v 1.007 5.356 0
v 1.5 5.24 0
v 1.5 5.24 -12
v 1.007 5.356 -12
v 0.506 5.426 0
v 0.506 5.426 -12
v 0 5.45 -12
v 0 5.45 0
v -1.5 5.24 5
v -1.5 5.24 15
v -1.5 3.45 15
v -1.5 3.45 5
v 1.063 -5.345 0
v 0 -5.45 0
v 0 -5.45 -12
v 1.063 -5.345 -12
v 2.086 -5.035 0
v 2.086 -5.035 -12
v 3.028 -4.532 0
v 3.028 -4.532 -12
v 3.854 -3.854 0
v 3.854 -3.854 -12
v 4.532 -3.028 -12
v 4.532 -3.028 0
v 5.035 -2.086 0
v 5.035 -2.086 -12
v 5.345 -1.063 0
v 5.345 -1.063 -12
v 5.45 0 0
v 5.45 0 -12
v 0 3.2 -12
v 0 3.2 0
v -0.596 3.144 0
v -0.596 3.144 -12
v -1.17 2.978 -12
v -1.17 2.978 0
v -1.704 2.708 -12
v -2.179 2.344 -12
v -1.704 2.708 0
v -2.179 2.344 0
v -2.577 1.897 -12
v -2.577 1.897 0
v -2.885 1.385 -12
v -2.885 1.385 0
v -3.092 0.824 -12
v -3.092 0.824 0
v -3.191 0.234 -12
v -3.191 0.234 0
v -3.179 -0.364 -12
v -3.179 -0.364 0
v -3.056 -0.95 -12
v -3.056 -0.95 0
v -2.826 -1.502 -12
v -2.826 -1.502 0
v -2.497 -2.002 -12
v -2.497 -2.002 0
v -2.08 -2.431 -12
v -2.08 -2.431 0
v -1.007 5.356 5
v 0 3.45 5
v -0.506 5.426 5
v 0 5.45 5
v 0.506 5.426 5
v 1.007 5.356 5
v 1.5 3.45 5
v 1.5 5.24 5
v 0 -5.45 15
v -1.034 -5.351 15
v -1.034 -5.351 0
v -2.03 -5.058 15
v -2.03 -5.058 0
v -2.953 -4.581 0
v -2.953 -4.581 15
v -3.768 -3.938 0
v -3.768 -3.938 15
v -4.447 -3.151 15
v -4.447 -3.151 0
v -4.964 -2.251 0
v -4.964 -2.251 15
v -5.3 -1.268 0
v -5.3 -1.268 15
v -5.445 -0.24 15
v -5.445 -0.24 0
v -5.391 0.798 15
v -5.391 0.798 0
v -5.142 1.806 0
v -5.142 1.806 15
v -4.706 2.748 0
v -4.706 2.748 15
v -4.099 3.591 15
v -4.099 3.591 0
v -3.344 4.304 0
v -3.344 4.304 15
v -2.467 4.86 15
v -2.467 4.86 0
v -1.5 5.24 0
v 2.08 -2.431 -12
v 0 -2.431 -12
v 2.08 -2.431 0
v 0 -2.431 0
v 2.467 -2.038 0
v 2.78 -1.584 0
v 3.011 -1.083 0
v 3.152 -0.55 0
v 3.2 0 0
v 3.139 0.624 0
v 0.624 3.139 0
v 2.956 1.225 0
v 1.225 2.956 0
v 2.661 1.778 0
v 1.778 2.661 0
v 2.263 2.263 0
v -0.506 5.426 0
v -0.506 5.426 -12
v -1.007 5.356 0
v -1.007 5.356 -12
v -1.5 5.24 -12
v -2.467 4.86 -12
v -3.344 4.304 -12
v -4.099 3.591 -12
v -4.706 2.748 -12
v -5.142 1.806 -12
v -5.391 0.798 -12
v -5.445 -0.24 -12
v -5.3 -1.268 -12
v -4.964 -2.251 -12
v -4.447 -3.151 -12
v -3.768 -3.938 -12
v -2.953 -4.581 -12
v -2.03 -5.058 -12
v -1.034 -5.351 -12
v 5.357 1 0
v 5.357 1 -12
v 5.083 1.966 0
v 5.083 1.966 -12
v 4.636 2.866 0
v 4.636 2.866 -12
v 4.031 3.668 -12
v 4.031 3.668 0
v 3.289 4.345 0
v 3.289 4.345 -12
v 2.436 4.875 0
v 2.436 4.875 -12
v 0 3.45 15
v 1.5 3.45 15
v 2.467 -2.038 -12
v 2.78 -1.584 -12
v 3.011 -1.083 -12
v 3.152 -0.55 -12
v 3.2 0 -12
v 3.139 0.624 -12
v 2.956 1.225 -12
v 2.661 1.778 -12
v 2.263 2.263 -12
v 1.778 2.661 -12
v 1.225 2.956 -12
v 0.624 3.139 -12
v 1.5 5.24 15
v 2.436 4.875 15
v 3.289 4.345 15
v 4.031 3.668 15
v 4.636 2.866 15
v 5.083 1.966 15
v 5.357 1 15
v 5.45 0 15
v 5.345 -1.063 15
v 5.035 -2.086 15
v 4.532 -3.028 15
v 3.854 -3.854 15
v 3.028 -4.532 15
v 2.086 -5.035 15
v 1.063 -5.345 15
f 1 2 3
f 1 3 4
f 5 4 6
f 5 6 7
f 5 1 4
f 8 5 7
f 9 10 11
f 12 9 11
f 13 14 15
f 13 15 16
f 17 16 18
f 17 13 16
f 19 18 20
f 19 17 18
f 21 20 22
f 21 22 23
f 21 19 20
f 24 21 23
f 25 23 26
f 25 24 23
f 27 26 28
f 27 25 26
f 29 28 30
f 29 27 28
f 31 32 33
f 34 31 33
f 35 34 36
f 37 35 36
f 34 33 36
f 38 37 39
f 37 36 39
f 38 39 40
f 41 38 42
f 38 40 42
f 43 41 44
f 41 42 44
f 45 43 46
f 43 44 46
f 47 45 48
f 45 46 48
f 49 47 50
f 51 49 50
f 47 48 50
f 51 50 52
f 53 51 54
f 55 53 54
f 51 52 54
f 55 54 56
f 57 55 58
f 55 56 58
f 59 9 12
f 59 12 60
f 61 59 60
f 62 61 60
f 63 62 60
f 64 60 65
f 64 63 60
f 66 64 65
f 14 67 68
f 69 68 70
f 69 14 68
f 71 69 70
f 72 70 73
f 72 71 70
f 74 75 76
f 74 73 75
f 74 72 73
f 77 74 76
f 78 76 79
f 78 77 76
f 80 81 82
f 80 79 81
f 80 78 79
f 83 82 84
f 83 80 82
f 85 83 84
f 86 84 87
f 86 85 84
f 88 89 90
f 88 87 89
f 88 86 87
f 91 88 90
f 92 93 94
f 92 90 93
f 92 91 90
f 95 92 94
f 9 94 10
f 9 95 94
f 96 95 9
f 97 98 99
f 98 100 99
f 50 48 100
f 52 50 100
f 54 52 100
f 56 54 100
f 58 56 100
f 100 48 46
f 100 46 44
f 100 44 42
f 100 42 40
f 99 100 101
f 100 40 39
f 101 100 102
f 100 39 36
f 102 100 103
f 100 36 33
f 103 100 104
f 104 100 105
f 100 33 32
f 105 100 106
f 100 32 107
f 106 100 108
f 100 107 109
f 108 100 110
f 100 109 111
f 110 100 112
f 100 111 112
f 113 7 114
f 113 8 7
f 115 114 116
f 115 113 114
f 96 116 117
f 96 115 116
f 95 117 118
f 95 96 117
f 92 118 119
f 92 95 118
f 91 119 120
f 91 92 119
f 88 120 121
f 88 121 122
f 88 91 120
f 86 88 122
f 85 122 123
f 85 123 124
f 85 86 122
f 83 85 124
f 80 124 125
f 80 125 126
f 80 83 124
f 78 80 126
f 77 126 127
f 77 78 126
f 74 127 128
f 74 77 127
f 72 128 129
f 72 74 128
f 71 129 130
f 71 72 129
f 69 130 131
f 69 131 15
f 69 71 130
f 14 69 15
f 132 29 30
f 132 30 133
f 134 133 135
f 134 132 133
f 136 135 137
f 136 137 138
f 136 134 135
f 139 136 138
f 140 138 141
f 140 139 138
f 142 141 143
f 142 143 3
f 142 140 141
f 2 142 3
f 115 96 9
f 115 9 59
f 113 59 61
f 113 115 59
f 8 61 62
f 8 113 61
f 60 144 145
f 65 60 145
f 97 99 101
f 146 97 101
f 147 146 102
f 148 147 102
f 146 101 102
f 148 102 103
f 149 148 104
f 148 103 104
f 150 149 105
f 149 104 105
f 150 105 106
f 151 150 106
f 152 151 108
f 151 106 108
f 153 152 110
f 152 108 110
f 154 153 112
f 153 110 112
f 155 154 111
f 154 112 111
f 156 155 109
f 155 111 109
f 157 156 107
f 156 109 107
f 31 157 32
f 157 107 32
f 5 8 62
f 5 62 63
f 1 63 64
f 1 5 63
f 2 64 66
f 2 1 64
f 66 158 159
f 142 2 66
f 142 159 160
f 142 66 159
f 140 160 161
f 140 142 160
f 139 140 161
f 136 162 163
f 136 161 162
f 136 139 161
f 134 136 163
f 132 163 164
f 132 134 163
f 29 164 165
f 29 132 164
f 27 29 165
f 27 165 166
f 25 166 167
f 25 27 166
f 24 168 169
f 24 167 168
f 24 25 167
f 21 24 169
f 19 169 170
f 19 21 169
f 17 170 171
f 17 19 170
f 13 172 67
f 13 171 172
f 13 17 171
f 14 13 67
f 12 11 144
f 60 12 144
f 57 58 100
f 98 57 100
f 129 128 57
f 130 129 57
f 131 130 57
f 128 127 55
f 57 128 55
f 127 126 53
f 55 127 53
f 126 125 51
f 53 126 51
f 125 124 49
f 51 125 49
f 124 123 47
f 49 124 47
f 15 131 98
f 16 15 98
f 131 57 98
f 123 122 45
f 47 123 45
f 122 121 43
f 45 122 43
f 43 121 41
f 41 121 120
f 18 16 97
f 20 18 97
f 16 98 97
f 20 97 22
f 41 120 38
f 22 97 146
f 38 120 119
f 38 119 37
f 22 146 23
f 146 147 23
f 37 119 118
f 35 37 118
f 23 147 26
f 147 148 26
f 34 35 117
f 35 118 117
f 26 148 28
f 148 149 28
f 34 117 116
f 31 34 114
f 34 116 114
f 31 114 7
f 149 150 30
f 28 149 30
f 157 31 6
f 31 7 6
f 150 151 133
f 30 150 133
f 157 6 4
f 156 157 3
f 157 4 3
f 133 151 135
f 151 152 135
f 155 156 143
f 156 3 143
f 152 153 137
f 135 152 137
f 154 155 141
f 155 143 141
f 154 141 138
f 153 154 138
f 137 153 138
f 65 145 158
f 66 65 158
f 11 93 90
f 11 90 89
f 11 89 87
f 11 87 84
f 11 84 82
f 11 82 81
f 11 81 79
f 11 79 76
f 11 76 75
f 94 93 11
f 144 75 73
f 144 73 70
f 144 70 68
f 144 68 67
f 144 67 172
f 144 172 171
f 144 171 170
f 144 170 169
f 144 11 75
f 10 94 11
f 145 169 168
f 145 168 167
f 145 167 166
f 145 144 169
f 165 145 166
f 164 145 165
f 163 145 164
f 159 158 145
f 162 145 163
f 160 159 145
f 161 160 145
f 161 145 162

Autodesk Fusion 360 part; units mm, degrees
sketch "Sketch1" plane through (0, 0, 0) normal (0, 0, 1) x (1, 0, 0)
  circle A0 centre (0, 0) radius 5.45
  line L0 (0, 7.5) -> (0, -6)
  line L1 (-1.5, 5.2395) -> (-1.5, 3.45)
  line L2 (-1.5, 3.45) -> (1.5, 3.45)
  line L3 (1.5, 3.45) -> (1.5, 5.2395)
  circle A1 centre (0, 0) radius 3.2
  line L4 (-2.0805, -2.4314) -> (2.0805, -2.4314)
  point P0 (0, 5.45)
  dimension "d1" = 10.9
  dimension "d2" = 2
  dimension "d3" = 3
  dimension "d4" = 6.4
  dimension "d5" = 4.161
extrude "Extrude1" add sketch "Sketch1" along normal blind 15
extrude "Extrude2" add sketch "Sketch1" against normal blind 12 contours A0 L0 L2 L3 A1 | A0 L0 L2 L3 | A0 L0 L1 L2 A1 | A0 L0 L1 L2 | L0 A1 L4 | L0 A1 L4 picked at (-0.1505, -2.9331) picked at (0.1505, -2.9331)
extrude "Extrude3" cut sketch "Sketch1" against normal blind 10 from surface at 15 contours A0 L0 L2 L3 | A0 L0 L1 L2
